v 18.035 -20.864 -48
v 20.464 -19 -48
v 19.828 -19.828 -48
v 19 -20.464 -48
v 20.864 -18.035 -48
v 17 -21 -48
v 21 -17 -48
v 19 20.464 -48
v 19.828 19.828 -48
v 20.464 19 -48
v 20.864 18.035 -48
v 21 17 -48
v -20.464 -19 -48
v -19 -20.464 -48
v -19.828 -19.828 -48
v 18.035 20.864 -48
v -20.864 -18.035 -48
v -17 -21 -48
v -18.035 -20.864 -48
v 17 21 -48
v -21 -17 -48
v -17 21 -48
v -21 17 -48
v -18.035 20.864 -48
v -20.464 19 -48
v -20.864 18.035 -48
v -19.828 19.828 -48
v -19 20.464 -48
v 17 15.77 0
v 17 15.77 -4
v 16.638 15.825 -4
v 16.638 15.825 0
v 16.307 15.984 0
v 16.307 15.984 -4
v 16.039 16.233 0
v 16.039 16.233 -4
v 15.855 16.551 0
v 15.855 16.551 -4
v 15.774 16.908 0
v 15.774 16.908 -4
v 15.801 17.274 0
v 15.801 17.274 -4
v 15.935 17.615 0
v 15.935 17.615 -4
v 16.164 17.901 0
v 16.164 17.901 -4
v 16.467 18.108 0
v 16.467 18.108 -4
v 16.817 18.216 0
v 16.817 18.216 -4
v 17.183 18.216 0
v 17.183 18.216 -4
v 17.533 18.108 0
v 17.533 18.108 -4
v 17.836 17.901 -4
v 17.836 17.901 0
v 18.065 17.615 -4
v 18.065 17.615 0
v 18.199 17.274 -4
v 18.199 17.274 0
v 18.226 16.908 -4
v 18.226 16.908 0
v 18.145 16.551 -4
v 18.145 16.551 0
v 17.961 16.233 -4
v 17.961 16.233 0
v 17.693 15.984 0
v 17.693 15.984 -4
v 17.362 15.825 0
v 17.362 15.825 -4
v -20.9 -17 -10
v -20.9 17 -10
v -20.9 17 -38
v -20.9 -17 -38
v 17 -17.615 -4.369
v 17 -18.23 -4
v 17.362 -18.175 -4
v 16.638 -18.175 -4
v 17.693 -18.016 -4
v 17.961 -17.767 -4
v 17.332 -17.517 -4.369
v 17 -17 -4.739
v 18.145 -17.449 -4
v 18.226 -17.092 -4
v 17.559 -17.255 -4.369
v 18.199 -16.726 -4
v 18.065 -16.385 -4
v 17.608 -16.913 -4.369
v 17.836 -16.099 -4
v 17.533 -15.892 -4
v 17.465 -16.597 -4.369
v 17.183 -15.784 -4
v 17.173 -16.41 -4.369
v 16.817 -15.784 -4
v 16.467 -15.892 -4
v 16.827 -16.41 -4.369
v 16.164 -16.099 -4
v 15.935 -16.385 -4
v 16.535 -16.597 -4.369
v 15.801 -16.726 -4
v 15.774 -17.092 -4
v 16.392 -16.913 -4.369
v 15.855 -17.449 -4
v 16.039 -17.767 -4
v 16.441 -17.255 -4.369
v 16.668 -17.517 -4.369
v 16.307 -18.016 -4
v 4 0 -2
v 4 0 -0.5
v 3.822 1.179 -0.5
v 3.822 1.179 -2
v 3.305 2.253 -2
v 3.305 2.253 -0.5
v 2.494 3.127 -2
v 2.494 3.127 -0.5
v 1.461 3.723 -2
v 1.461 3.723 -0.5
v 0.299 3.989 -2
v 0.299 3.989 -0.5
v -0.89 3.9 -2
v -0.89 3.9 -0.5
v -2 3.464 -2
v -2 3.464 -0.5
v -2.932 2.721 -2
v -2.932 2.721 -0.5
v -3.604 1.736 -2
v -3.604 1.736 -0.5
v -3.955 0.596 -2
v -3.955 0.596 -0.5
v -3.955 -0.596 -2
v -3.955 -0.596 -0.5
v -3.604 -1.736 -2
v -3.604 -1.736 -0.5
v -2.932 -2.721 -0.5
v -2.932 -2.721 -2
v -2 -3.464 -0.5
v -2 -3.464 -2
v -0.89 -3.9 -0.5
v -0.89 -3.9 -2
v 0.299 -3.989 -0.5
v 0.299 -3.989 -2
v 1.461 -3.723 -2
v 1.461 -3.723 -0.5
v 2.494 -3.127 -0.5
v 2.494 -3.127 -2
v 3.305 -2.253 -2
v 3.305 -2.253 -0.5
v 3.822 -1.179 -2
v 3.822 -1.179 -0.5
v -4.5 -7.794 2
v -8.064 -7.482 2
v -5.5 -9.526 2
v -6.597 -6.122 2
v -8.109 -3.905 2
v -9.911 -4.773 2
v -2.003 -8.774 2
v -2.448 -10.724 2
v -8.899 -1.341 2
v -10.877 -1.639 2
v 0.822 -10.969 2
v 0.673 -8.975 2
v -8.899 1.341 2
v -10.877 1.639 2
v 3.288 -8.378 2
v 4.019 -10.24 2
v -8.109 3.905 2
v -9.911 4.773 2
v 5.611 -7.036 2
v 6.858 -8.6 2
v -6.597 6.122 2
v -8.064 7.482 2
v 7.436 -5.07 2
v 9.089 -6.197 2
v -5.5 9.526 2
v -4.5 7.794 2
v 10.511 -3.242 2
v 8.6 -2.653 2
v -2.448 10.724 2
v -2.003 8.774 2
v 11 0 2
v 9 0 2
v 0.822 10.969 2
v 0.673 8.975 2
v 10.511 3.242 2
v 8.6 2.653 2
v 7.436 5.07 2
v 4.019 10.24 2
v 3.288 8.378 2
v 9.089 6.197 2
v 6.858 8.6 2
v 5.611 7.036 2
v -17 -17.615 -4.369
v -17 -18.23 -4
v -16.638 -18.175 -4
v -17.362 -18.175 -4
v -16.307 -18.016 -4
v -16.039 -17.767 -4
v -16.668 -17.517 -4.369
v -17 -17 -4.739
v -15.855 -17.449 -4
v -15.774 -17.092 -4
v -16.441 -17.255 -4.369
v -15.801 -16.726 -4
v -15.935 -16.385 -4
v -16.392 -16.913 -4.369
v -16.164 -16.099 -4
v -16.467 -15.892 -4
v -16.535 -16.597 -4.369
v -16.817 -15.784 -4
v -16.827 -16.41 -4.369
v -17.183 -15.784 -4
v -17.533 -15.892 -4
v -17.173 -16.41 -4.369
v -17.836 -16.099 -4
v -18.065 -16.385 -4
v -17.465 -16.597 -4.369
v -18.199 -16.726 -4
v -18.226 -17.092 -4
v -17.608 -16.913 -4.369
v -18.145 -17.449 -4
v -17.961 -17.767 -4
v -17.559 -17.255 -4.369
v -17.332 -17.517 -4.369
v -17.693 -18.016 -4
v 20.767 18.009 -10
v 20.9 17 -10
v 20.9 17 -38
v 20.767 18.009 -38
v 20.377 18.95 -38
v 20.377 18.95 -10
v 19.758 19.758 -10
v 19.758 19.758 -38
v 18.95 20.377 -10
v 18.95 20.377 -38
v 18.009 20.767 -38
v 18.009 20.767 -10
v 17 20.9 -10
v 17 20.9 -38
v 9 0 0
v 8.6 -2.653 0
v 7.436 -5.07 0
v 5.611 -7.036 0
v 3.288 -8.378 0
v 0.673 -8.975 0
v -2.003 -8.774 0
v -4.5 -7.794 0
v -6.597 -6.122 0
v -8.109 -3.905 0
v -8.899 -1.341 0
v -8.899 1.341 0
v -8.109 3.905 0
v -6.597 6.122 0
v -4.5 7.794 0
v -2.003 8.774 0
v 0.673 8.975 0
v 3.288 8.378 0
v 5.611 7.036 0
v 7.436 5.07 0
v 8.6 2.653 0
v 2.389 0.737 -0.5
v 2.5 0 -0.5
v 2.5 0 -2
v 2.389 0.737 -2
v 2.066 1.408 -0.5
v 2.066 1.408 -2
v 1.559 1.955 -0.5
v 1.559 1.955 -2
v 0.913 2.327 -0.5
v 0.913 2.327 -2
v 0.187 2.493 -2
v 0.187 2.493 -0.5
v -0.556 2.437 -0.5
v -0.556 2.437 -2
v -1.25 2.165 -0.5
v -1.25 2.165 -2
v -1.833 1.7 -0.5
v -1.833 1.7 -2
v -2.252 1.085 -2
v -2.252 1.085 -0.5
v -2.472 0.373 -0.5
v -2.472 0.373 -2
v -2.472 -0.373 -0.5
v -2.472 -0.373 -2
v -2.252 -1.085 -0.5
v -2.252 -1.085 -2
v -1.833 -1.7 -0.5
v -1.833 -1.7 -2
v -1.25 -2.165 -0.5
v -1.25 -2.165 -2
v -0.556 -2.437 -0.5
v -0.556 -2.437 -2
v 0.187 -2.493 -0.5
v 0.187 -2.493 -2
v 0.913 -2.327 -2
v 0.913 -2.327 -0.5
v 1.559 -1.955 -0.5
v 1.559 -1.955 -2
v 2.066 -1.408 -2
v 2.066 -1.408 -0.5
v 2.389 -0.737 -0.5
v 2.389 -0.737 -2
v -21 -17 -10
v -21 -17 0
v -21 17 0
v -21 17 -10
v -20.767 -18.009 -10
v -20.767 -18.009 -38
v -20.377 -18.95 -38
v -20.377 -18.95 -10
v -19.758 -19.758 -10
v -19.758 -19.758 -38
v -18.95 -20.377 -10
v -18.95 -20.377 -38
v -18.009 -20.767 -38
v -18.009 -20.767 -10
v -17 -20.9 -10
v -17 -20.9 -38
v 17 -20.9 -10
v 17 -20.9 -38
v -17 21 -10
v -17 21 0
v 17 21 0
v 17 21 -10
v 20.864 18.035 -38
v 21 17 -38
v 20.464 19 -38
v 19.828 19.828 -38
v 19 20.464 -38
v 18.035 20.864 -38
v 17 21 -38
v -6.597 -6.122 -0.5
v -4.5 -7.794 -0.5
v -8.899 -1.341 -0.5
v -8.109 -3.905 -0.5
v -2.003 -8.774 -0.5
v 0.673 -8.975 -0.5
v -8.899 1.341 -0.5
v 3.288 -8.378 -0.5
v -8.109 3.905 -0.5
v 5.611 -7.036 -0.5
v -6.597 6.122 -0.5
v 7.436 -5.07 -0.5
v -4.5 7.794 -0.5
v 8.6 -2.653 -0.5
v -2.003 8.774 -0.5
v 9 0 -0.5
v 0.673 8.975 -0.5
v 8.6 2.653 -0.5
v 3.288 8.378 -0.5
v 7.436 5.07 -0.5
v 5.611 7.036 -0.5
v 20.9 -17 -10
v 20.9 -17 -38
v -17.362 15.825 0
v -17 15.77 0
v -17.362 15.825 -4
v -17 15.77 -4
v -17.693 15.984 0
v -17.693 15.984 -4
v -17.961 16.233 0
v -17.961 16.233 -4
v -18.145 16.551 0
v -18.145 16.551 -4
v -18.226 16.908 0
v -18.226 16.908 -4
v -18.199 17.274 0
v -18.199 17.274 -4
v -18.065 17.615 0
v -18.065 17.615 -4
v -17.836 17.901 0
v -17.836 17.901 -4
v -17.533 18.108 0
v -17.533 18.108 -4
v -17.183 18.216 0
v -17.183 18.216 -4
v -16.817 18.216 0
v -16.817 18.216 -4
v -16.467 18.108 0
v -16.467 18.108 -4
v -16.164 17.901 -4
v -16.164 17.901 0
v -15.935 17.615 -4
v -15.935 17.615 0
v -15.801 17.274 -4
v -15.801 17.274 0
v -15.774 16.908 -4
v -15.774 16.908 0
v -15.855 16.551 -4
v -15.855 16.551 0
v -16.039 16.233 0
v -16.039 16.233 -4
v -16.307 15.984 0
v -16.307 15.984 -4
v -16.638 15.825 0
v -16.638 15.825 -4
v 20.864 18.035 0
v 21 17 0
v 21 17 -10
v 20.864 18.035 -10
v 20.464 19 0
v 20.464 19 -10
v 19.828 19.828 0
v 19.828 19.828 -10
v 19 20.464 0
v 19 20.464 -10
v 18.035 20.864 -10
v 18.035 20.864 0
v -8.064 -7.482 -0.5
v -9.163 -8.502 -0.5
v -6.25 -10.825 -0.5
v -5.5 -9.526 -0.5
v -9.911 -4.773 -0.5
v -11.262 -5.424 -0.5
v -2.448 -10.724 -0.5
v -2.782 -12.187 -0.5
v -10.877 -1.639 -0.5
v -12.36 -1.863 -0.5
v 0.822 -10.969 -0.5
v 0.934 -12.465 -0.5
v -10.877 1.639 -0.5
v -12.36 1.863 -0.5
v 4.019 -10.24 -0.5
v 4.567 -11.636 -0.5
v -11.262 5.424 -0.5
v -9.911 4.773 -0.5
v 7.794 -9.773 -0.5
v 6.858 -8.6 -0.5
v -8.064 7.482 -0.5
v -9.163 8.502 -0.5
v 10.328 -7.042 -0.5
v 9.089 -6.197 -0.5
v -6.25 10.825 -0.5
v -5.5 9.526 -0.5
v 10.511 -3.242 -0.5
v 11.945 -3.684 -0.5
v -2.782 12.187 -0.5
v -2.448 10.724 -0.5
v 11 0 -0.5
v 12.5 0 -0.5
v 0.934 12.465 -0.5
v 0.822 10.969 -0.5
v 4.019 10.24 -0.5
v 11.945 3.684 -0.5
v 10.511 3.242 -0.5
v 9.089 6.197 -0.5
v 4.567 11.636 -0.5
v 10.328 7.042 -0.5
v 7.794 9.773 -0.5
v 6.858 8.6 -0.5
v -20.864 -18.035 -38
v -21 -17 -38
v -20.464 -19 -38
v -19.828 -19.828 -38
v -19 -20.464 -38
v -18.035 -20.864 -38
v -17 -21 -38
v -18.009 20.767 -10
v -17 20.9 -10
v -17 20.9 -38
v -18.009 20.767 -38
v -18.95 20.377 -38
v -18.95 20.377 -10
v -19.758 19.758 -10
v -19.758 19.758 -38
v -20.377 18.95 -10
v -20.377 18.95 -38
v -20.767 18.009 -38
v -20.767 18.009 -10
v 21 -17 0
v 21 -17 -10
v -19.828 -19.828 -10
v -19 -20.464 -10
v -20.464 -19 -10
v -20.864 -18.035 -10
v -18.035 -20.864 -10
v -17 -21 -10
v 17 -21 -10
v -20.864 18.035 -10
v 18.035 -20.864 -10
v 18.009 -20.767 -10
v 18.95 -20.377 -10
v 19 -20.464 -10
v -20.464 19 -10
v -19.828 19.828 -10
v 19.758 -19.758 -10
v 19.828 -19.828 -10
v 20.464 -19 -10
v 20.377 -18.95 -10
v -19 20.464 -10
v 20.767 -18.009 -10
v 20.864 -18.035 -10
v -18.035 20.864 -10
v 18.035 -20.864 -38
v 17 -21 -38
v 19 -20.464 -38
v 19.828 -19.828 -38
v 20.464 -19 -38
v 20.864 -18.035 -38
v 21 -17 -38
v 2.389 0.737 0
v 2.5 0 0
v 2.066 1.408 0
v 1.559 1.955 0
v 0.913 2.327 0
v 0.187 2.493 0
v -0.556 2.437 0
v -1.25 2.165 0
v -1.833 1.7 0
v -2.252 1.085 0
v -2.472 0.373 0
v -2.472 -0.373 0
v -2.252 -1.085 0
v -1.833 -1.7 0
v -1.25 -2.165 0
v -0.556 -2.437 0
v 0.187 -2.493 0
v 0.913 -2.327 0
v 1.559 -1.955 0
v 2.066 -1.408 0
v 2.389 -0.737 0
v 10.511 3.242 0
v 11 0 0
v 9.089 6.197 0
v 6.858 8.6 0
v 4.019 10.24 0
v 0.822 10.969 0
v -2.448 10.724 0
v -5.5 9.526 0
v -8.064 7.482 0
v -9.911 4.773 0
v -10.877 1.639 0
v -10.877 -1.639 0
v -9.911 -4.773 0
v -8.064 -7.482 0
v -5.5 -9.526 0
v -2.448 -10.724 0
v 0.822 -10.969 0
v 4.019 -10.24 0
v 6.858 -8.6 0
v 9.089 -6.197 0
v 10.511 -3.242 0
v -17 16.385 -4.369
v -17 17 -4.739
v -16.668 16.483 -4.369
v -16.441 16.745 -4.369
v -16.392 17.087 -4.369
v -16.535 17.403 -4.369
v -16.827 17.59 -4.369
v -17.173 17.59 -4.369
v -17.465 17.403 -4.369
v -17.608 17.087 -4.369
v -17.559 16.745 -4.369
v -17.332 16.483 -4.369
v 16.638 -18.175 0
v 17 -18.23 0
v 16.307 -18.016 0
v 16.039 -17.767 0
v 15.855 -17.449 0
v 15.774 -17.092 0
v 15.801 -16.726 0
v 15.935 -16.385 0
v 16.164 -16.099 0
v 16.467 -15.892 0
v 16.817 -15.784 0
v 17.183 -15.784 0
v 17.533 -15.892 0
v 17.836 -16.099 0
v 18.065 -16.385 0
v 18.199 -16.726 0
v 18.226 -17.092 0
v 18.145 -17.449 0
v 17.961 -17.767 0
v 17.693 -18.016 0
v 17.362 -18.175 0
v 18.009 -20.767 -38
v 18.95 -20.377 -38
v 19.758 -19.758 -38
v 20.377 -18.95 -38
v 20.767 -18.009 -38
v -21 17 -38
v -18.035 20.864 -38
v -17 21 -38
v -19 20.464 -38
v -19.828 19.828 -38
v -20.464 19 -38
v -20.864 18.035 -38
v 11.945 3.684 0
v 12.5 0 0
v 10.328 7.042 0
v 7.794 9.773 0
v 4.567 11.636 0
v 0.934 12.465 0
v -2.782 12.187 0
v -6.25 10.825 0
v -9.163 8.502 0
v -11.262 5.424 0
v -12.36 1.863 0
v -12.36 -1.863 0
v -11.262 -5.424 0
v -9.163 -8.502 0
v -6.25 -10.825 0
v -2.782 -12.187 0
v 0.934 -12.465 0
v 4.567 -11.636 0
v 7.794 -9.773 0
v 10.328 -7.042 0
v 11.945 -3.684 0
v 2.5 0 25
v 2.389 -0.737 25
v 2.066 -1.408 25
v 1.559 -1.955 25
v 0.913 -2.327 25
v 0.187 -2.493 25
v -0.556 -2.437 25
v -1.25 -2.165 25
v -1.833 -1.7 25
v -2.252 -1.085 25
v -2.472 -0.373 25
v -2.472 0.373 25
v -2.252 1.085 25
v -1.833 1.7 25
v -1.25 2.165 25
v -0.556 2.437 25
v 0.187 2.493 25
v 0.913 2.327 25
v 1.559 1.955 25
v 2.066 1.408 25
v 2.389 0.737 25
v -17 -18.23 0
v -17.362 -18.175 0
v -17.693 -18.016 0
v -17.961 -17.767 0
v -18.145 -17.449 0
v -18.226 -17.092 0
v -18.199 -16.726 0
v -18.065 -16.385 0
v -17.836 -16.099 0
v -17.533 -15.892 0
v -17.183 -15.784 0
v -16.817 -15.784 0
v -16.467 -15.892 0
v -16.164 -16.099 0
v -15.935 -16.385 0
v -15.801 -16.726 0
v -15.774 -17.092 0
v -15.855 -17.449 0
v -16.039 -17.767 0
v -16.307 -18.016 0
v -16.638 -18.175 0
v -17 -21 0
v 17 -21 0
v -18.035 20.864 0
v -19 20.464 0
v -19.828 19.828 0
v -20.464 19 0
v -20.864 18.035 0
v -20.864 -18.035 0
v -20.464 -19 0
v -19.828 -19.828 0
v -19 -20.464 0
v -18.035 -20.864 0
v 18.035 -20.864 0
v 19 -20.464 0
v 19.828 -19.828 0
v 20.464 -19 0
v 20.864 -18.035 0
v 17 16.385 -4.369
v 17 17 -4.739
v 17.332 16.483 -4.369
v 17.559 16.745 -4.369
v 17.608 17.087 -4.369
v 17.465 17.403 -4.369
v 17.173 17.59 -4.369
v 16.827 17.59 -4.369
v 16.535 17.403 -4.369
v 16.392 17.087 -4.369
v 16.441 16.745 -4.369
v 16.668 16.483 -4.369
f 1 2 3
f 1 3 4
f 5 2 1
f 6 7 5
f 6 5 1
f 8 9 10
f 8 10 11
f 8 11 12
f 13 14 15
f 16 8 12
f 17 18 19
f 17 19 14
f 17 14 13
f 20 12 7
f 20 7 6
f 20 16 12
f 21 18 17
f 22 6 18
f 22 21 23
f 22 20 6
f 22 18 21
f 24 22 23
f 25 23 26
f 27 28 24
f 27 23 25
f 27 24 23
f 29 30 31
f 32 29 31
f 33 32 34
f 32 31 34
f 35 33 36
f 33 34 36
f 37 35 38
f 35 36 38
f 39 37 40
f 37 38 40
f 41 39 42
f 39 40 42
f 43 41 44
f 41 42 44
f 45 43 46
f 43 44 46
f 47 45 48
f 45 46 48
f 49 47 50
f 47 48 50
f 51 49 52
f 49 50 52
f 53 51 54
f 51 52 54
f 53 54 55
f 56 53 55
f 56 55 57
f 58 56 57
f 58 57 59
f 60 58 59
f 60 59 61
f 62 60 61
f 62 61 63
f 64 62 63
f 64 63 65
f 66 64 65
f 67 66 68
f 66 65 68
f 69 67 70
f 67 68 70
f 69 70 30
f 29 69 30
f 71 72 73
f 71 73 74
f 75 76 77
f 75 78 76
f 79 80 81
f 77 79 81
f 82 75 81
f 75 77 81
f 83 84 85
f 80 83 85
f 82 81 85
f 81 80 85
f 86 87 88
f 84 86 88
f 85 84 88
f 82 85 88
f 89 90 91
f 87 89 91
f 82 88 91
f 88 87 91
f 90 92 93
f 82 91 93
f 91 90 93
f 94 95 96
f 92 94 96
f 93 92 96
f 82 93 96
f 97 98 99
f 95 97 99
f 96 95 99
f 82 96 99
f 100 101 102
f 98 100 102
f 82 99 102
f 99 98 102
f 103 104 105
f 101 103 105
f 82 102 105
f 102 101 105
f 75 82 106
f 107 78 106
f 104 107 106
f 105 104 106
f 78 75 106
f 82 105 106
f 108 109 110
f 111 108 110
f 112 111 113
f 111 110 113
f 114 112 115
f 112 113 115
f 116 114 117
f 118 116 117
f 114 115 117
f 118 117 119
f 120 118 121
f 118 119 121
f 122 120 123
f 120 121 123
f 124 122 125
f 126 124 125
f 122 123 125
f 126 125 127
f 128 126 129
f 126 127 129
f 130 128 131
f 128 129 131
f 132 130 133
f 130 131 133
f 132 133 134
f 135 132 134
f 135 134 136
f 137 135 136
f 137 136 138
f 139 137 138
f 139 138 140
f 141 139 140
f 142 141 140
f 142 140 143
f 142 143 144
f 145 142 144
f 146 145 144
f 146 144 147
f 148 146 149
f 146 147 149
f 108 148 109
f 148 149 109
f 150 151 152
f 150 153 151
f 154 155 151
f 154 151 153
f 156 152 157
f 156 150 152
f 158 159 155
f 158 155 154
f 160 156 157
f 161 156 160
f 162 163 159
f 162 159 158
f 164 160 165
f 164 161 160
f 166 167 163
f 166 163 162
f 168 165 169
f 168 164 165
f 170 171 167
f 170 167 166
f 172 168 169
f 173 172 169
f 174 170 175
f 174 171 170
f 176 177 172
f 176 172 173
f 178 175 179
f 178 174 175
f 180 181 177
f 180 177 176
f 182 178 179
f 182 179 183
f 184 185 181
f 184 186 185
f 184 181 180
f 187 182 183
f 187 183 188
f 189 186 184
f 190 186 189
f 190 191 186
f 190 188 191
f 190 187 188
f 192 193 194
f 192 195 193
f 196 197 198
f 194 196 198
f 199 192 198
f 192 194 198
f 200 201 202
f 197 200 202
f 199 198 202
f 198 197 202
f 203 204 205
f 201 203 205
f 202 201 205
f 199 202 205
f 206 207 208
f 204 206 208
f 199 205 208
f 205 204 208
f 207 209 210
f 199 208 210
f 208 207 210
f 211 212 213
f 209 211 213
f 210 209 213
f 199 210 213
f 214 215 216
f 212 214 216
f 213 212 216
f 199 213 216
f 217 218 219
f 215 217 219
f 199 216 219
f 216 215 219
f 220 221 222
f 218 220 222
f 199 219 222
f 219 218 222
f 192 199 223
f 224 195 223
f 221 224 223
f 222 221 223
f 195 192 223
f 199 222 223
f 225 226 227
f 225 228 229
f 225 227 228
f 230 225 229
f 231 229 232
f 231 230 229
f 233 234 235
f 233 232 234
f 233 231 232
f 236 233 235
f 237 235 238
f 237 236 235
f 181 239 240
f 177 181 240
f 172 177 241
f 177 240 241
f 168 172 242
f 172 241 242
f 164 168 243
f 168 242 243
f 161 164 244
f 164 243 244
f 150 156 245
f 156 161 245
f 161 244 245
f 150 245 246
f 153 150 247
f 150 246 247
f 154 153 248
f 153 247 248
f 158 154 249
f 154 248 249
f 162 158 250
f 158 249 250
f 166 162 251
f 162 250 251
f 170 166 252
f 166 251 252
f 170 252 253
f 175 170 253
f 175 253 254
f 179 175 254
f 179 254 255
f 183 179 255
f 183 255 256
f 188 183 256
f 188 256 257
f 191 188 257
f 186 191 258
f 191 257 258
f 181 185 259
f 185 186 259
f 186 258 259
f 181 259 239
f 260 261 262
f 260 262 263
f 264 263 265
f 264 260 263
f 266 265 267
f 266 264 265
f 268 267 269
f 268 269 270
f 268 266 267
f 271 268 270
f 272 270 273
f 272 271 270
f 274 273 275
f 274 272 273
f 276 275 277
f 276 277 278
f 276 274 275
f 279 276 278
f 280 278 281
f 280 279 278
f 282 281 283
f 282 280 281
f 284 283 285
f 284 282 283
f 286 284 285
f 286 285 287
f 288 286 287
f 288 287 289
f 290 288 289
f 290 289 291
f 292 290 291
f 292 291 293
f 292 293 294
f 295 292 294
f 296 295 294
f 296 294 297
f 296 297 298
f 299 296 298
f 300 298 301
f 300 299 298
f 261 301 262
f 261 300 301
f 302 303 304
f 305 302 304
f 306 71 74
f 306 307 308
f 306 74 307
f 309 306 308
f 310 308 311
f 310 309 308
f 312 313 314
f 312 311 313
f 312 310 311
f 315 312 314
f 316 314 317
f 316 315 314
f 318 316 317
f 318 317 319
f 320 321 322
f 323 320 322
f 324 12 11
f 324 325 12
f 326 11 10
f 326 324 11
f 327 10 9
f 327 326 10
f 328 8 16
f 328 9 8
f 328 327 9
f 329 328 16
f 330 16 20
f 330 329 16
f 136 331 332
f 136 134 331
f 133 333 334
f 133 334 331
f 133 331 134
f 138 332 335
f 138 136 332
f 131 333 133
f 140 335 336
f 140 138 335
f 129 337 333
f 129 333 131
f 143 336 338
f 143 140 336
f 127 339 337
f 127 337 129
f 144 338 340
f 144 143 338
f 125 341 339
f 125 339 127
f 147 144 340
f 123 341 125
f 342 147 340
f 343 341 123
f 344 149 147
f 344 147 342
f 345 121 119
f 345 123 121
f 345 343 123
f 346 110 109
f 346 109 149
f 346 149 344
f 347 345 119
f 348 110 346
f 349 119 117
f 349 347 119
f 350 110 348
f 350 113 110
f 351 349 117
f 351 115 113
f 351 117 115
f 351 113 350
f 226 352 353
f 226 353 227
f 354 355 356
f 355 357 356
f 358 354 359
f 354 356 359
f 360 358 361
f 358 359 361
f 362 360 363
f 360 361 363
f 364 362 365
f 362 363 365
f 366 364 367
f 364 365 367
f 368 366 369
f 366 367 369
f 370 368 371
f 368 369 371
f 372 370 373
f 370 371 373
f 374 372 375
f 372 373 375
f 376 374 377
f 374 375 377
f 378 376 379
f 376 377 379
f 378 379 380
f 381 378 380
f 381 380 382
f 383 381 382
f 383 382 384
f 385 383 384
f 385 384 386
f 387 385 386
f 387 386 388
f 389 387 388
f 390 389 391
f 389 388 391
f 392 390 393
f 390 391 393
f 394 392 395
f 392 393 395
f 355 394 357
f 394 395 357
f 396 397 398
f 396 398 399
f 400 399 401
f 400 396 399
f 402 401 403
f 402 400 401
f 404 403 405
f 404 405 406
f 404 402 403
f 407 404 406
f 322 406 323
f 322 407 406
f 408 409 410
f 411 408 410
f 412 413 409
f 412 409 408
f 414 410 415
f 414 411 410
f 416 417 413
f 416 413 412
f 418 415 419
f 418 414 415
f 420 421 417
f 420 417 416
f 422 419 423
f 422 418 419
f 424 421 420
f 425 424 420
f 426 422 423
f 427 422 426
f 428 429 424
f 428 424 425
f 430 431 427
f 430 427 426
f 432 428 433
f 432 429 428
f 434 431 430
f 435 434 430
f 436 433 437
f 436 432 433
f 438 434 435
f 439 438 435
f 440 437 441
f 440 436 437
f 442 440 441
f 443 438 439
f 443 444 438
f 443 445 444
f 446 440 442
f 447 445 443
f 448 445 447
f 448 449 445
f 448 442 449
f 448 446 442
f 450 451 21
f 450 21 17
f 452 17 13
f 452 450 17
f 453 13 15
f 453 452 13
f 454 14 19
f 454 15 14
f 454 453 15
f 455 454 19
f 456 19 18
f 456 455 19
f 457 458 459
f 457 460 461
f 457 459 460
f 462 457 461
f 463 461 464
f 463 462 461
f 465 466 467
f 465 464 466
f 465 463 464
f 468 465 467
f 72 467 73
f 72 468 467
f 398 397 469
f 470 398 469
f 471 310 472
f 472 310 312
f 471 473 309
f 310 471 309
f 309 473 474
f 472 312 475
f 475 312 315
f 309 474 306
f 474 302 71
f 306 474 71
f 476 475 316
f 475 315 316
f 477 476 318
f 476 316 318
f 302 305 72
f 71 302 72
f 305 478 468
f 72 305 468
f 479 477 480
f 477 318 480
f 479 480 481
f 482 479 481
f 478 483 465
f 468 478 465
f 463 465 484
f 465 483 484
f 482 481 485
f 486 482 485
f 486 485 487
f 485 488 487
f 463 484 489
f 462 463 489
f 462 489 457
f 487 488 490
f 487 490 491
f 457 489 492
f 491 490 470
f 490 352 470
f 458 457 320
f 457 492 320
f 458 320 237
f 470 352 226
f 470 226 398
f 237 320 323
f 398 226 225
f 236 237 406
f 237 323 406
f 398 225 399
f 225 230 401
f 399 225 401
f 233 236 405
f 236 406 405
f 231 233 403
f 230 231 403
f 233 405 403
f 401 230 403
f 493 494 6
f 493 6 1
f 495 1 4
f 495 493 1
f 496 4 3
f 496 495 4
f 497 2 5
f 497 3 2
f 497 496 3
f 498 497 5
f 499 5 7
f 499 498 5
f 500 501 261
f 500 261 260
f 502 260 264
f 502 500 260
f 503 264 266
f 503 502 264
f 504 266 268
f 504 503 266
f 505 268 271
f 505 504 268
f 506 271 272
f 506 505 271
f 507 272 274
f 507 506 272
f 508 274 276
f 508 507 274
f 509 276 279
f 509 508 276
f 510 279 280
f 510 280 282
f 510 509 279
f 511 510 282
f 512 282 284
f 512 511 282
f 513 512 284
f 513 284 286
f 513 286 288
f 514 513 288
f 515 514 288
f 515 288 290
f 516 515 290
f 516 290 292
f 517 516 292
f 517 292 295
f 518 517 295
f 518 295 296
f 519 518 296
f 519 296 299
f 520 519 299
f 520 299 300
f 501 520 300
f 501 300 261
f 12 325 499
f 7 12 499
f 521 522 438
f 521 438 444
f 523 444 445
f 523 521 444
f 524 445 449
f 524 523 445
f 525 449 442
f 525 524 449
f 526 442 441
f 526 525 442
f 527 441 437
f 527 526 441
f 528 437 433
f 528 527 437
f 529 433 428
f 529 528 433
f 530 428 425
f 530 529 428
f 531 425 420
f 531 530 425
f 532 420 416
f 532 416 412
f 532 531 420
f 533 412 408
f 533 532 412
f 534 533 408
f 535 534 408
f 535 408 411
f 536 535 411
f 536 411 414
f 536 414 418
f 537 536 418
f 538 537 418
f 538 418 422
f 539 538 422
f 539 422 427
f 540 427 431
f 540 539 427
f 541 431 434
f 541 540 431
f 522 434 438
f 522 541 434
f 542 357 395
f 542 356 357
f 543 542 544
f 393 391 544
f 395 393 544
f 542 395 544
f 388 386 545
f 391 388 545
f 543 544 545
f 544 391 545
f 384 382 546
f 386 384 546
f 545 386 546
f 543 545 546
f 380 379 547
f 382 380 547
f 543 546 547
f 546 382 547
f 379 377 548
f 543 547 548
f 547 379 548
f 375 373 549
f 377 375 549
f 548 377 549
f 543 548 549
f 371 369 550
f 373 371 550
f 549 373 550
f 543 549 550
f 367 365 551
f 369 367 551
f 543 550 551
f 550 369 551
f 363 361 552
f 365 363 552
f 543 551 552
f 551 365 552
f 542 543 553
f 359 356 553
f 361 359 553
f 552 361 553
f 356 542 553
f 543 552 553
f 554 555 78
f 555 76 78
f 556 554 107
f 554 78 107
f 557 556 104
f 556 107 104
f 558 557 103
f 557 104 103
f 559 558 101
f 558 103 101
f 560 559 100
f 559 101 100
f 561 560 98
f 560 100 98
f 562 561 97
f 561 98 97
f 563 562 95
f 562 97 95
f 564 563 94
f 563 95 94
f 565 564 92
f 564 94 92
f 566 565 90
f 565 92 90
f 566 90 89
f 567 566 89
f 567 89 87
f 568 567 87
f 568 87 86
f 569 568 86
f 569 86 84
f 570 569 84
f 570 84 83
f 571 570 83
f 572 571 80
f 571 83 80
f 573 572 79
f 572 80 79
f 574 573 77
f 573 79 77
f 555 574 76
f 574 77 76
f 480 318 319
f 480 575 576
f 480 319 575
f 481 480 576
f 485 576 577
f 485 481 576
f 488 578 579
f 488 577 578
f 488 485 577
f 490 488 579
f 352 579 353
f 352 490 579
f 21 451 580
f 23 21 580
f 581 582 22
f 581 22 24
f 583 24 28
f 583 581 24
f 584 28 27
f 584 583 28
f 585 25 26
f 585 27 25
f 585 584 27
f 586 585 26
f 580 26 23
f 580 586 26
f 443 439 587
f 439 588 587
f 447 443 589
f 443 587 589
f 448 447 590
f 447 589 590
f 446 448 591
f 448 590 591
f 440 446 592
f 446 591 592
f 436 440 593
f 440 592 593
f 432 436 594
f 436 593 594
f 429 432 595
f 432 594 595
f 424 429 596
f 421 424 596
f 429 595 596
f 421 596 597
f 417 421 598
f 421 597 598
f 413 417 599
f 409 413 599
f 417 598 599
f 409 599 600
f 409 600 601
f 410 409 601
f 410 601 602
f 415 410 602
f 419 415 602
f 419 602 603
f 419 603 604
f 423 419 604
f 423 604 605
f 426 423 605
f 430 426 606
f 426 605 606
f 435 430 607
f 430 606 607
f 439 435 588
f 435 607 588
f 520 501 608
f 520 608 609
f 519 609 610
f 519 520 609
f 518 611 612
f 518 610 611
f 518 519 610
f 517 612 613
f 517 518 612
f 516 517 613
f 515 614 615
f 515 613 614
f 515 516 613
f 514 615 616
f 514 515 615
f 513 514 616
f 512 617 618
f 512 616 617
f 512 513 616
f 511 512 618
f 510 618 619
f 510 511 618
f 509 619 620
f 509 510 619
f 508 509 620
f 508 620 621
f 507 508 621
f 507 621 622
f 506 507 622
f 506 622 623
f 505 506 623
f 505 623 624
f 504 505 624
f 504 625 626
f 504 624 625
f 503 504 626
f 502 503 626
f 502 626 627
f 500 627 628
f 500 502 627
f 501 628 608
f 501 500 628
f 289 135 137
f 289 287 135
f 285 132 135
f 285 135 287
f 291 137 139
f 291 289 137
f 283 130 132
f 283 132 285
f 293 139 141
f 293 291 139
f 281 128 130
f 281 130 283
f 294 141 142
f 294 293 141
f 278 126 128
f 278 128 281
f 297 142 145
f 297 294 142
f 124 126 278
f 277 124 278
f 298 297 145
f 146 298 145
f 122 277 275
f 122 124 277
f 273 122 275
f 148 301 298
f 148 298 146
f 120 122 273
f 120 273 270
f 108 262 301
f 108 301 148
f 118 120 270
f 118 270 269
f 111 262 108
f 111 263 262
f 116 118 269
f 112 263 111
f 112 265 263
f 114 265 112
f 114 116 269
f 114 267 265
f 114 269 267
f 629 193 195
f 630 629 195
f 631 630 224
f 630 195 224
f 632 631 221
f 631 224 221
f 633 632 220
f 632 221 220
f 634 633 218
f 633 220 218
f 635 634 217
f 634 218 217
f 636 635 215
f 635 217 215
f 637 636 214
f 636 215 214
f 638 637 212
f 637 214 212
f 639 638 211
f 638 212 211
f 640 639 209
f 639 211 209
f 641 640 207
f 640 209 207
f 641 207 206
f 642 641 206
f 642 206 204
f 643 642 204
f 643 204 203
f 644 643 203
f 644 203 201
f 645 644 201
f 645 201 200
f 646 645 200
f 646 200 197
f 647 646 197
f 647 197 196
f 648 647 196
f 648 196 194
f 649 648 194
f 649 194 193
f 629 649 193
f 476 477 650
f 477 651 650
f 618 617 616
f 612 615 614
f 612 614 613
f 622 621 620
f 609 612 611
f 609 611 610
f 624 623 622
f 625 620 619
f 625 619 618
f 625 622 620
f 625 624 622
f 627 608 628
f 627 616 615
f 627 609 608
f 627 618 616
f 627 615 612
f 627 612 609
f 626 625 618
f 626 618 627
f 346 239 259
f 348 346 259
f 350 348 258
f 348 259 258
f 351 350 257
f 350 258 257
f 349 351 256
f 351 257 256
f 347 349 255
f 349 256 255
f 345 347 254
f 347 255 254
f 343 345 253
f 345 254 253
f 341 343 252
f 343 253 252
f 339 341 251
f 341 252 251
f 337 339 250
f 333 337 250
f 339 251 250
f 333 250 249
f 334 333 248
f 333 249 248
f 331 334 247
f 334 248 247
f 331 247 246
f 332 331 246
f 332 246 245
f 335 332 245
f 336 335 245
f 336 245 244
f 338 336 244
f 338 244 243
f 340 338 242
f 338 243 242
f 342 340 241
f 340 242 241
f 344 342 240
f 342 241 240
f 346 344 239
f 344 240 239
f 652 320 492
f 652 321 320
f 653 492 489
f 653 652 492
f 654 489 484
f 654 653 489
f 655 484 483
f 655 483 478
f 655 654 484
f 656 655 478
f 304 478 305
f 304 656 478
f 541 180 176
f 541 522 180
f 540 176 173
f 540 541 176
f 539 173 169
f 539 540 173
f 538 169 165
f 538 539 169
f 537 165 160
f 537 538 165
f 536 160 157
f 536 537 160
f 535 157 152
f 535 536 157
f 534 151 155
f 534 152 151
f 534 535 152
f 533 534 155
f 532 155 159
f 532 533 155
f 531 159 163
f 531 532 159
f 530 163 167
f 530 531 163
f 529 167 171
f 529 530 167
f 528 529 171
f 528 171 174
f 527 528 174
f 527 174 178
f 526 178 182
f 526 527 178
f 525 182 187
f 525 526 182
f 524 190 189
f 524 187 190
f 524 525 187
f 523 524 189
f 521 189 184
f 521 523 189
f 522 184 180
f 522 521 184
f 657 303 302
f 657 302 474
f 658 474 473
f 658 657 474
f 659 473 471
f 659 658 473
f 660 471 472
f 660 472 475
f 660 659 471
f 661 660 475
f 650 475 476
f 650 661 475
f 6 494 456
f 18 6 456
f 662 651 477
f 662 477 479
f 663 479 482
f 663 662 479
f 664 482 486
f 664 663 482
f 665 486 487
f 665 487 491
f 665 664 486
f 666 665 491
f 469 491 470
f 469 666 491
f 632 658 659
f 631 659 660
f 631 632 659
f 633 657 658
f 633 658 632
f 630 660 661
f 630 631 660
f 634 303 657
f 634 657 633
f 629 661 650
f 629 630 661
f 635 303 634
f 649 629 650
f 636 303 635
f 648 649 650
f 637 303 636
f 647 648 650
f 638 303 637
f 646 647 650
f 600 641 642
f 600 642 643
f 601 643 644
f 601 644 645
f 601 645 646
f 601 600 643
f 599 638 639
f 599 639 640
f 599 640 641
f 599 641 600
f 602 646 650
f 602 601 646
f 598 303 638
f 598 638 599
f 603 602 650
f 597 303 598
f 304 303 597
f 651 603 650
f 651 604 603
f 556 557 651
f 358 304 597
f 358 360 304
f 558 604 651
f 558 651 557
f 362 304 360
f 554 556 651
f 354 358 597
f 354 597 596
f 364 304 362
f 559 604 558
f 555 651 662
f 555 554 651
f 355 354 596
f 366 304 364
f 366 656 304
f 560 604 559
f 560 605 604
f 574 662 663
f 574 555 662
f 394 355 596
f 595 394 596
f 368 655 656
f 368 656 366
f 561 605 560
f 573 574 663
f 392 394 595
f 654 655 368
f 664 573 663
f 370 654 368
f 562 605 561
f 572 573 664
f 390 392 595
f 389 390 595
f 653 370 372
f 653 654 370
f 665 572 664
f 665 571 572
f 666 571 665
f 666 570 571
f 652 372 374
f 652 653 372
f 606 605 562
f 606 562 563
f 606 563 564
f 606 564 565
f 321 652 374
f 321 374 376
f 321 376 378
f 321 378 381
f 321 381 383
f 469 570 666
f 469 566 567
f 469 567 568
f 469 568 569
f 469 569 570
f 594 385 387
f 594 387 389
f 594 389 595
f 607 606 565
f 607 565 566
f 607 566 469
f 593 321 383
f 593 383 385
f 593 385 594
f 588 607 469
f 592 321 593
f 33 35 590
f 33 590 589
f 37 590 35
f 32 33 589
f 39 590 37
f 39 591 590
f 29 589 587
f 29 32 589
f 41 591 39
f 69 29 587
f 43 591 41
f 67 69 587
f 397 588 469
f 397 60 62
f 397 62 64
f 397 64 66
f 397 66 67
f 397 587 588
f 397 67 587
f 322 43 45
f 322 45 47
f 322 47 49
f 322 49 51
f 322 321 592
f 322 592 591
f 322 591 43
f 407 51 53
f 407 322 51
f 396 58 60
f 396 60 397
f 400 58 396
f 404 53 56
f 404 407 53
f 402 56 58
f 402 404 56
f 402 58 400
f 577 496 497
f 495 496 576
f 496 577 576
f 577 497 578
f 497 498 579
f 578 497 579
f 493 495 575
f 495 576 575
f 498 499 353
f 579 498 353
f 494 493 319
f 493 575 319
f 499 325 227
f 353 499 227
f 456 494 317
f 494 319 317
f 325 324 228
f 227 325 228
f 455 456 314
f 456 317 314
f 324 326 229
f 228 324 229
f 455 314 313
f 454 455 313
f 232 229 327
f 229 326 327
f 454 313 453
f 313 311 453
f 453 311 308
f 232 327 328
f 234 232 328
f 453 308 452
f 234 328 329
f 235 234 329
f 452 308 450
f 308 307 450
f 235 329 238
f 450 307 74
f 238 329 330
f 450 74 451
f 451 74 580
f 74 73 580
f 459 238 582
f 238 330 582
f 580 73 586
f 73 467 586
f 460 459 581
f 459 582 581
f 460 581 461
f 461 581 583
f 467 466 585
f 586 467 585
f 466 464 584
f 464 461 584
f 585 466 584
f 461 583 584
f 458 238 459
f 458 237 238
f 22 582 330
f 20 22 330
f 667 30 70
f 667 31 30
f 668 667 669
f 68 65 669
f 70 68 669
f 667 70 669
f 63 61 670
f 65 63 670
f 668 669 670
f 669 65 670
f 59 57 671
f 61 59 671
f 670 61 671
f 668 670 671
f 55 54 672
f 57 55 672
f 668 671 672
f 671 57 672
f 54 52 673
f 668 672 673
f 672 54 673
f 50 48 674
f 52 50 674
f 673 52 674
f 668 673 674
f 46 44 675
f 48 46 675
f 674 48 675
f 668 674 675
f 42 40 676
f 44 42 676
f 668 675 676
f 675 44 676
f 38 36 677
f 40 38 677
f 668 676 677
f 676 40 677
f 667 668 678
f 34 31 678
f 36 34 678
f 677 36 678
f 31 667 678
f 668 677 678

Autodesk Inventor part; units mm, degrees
ref_plane "YZ Plane" through (0, 0, 0) normal (1, 0, 0) x (0, 1, 0)
sketch "Sketch1" plane through (0, 0, 0) normal (0, 0, 1) x (1, 0, 0)
  circle A0 centre (0, 0) radius 12.5
  circle A1 centre (0, 0) radius 9
  circle A2 centre (0, 0) radius 11
  line L0 (17, -21) -> (-17, -21)
  line L1 (-21, -17) -> (-21, 17)
  line L2 (-17, 21) -> (17, 21)
  line L3 (21, 17) -> (21, -17)
  line L4 (21, -21) -> (-21, 21) construction
  line L5 (-21, -21) -> (21, 21) construction
  arc A3 (-17, 21) -> (-21, 17) centre (-17, 17) ccw
  arc A4 (-21, -17) -> (-17, -21) centre (-17, -17) ccw
  arc A5 (17, -21) -> (21, -17) centre (17, -17) ccw
  arc A6 (21, 17) -> (17, 21) centre (17, 17) ccw
  line L6 (15.5, -15.5) -> (-15.5, -15.5) construction
  line L7 (-15.5, -15.5) -> (-15.5, 15.5) construction
  line L8 (-15.5, 15.5) -> (15.5, 15.5) construction
  line L9 (15.5, 15.5) -> (15.5, -15.5) construction
  line L10 (15.5, -15.5) -> (-15.5, 15.5) construction
  line L11 (-15.5, -15.5) -> (15.5, 15.5) construction
  circle A7 centre (0, 0) radius 2.5
  circle A8 centre (0, 0) radius 4
  dimension "d0" = 42
  dimension "d2" = 42
  dimension "d3" = 4
  dimension "d4" = 18
  dimension "d5" = 22
  dimension "d6" = 25
  dimension "d7" = 31
  dimension "d22" = 5
  dimension "d23" = 8
ref_plane "Work Plane1" through (0, 0, -10) normal (0, 0, 1) x (1, 0, 0)
ref_plane "Work Plane3" through (0, 0, -38) normal (0, 0, 1) x (1, 0, 0)
ref_plane "Work Plane2" through (0, 0, -48) normal (0, 0, 1) x (1, 0, 0)
extrude "Extrusion1" add sketch "Sketch1" against normal up to surface (10 mm away) from surface at 0 contours A0 | A1 | A2 | L0 A4 L1 A3 L2 A6 L3 A5 | A7 | A8
sketch "Sketch2" plane through (17, 21, -10) normal (0, 0, -1) x (-1, 0, 0)
  arc A0 (34, -42) -> (38, -38) centre (34, -38) ccw projected
  line L0 (38, -38) -> (38, -4) projected
  arc A1 (38, -4) -> (34, 0) centre (34, -4) ccw projected
  line L1 (34, 0) -> (0, 0) projected
  arc A2 (0, 0) -> (-4, -4) centre (0, -4) ccw projected
  line L2 (-4, -4) -> (-4, -38) projected
  arc A3 (-4, -38) -> (0, -42) centre (0, -38) ccw projected
  line L3 (0, -42) -> (34, -42) projected
  line L4 (0, -0.1) -> (34, -0.1)
  arc A4 (37.9, -4) -> (34, -0.1) centre (34, -4) ccw
  line L5 (37.9, -4) -> (37.9, -38)
  arc A5 (34, -41.9) -> (37.9, -38) centre (34, -38) ccw
  line L6 (34, -41.9) -> (0, -41.9)
  arc A6 (-3.9, -38) -> (0, -41.9) centre (0, -38) ccw
  line L7 (-3.9, -38) -> (-3.9, -4)
  arc A7 (0, -0.1) -> (-3.9, -4) centre (0, -4) ccw
  point P0 (17, -21)
  dimension "d13" = 0.1
extrude "Extrusion2" add sketch "Sketch2" along normal up to surface (10 mm away) from surface at 28 contours L3 A3 L2 A2 L1 A1 L0 A0 | L4 A4 L5 A5 L6 A6 L7 A7
extrude "Extrusion3" add sketch "Sketch2" along normal up to surface (28 mm away) from surface at 0 contours L4 A4 L5 A5 L6 A6 L7 A7
extrude "Extrusion4" cut sketch "Sketch1" against normal blind 0.5 contours A0 | A1 | A8
extrude "Extrusion5" add sketch "Sketch1" along normal blind 2 contours A2
extrude "Extrusion6" cut sketch "Sketch1" against normal blind 2 contours A8
extrude "Extrusion7" add sketch "Sketch1" along normal blind 25 contours A7
hole "Hole1" at (-17, 17, 0) at (-17, -17, 0) at (17, -17, 0) at (17, 17, 0) direction (0, 0, -1) diameter 2.459 depth 4 tip angle 118 thread size "M3x0.5" class "6H" standard "ISO Metric profile"
properties part number "nema17 48mm"
